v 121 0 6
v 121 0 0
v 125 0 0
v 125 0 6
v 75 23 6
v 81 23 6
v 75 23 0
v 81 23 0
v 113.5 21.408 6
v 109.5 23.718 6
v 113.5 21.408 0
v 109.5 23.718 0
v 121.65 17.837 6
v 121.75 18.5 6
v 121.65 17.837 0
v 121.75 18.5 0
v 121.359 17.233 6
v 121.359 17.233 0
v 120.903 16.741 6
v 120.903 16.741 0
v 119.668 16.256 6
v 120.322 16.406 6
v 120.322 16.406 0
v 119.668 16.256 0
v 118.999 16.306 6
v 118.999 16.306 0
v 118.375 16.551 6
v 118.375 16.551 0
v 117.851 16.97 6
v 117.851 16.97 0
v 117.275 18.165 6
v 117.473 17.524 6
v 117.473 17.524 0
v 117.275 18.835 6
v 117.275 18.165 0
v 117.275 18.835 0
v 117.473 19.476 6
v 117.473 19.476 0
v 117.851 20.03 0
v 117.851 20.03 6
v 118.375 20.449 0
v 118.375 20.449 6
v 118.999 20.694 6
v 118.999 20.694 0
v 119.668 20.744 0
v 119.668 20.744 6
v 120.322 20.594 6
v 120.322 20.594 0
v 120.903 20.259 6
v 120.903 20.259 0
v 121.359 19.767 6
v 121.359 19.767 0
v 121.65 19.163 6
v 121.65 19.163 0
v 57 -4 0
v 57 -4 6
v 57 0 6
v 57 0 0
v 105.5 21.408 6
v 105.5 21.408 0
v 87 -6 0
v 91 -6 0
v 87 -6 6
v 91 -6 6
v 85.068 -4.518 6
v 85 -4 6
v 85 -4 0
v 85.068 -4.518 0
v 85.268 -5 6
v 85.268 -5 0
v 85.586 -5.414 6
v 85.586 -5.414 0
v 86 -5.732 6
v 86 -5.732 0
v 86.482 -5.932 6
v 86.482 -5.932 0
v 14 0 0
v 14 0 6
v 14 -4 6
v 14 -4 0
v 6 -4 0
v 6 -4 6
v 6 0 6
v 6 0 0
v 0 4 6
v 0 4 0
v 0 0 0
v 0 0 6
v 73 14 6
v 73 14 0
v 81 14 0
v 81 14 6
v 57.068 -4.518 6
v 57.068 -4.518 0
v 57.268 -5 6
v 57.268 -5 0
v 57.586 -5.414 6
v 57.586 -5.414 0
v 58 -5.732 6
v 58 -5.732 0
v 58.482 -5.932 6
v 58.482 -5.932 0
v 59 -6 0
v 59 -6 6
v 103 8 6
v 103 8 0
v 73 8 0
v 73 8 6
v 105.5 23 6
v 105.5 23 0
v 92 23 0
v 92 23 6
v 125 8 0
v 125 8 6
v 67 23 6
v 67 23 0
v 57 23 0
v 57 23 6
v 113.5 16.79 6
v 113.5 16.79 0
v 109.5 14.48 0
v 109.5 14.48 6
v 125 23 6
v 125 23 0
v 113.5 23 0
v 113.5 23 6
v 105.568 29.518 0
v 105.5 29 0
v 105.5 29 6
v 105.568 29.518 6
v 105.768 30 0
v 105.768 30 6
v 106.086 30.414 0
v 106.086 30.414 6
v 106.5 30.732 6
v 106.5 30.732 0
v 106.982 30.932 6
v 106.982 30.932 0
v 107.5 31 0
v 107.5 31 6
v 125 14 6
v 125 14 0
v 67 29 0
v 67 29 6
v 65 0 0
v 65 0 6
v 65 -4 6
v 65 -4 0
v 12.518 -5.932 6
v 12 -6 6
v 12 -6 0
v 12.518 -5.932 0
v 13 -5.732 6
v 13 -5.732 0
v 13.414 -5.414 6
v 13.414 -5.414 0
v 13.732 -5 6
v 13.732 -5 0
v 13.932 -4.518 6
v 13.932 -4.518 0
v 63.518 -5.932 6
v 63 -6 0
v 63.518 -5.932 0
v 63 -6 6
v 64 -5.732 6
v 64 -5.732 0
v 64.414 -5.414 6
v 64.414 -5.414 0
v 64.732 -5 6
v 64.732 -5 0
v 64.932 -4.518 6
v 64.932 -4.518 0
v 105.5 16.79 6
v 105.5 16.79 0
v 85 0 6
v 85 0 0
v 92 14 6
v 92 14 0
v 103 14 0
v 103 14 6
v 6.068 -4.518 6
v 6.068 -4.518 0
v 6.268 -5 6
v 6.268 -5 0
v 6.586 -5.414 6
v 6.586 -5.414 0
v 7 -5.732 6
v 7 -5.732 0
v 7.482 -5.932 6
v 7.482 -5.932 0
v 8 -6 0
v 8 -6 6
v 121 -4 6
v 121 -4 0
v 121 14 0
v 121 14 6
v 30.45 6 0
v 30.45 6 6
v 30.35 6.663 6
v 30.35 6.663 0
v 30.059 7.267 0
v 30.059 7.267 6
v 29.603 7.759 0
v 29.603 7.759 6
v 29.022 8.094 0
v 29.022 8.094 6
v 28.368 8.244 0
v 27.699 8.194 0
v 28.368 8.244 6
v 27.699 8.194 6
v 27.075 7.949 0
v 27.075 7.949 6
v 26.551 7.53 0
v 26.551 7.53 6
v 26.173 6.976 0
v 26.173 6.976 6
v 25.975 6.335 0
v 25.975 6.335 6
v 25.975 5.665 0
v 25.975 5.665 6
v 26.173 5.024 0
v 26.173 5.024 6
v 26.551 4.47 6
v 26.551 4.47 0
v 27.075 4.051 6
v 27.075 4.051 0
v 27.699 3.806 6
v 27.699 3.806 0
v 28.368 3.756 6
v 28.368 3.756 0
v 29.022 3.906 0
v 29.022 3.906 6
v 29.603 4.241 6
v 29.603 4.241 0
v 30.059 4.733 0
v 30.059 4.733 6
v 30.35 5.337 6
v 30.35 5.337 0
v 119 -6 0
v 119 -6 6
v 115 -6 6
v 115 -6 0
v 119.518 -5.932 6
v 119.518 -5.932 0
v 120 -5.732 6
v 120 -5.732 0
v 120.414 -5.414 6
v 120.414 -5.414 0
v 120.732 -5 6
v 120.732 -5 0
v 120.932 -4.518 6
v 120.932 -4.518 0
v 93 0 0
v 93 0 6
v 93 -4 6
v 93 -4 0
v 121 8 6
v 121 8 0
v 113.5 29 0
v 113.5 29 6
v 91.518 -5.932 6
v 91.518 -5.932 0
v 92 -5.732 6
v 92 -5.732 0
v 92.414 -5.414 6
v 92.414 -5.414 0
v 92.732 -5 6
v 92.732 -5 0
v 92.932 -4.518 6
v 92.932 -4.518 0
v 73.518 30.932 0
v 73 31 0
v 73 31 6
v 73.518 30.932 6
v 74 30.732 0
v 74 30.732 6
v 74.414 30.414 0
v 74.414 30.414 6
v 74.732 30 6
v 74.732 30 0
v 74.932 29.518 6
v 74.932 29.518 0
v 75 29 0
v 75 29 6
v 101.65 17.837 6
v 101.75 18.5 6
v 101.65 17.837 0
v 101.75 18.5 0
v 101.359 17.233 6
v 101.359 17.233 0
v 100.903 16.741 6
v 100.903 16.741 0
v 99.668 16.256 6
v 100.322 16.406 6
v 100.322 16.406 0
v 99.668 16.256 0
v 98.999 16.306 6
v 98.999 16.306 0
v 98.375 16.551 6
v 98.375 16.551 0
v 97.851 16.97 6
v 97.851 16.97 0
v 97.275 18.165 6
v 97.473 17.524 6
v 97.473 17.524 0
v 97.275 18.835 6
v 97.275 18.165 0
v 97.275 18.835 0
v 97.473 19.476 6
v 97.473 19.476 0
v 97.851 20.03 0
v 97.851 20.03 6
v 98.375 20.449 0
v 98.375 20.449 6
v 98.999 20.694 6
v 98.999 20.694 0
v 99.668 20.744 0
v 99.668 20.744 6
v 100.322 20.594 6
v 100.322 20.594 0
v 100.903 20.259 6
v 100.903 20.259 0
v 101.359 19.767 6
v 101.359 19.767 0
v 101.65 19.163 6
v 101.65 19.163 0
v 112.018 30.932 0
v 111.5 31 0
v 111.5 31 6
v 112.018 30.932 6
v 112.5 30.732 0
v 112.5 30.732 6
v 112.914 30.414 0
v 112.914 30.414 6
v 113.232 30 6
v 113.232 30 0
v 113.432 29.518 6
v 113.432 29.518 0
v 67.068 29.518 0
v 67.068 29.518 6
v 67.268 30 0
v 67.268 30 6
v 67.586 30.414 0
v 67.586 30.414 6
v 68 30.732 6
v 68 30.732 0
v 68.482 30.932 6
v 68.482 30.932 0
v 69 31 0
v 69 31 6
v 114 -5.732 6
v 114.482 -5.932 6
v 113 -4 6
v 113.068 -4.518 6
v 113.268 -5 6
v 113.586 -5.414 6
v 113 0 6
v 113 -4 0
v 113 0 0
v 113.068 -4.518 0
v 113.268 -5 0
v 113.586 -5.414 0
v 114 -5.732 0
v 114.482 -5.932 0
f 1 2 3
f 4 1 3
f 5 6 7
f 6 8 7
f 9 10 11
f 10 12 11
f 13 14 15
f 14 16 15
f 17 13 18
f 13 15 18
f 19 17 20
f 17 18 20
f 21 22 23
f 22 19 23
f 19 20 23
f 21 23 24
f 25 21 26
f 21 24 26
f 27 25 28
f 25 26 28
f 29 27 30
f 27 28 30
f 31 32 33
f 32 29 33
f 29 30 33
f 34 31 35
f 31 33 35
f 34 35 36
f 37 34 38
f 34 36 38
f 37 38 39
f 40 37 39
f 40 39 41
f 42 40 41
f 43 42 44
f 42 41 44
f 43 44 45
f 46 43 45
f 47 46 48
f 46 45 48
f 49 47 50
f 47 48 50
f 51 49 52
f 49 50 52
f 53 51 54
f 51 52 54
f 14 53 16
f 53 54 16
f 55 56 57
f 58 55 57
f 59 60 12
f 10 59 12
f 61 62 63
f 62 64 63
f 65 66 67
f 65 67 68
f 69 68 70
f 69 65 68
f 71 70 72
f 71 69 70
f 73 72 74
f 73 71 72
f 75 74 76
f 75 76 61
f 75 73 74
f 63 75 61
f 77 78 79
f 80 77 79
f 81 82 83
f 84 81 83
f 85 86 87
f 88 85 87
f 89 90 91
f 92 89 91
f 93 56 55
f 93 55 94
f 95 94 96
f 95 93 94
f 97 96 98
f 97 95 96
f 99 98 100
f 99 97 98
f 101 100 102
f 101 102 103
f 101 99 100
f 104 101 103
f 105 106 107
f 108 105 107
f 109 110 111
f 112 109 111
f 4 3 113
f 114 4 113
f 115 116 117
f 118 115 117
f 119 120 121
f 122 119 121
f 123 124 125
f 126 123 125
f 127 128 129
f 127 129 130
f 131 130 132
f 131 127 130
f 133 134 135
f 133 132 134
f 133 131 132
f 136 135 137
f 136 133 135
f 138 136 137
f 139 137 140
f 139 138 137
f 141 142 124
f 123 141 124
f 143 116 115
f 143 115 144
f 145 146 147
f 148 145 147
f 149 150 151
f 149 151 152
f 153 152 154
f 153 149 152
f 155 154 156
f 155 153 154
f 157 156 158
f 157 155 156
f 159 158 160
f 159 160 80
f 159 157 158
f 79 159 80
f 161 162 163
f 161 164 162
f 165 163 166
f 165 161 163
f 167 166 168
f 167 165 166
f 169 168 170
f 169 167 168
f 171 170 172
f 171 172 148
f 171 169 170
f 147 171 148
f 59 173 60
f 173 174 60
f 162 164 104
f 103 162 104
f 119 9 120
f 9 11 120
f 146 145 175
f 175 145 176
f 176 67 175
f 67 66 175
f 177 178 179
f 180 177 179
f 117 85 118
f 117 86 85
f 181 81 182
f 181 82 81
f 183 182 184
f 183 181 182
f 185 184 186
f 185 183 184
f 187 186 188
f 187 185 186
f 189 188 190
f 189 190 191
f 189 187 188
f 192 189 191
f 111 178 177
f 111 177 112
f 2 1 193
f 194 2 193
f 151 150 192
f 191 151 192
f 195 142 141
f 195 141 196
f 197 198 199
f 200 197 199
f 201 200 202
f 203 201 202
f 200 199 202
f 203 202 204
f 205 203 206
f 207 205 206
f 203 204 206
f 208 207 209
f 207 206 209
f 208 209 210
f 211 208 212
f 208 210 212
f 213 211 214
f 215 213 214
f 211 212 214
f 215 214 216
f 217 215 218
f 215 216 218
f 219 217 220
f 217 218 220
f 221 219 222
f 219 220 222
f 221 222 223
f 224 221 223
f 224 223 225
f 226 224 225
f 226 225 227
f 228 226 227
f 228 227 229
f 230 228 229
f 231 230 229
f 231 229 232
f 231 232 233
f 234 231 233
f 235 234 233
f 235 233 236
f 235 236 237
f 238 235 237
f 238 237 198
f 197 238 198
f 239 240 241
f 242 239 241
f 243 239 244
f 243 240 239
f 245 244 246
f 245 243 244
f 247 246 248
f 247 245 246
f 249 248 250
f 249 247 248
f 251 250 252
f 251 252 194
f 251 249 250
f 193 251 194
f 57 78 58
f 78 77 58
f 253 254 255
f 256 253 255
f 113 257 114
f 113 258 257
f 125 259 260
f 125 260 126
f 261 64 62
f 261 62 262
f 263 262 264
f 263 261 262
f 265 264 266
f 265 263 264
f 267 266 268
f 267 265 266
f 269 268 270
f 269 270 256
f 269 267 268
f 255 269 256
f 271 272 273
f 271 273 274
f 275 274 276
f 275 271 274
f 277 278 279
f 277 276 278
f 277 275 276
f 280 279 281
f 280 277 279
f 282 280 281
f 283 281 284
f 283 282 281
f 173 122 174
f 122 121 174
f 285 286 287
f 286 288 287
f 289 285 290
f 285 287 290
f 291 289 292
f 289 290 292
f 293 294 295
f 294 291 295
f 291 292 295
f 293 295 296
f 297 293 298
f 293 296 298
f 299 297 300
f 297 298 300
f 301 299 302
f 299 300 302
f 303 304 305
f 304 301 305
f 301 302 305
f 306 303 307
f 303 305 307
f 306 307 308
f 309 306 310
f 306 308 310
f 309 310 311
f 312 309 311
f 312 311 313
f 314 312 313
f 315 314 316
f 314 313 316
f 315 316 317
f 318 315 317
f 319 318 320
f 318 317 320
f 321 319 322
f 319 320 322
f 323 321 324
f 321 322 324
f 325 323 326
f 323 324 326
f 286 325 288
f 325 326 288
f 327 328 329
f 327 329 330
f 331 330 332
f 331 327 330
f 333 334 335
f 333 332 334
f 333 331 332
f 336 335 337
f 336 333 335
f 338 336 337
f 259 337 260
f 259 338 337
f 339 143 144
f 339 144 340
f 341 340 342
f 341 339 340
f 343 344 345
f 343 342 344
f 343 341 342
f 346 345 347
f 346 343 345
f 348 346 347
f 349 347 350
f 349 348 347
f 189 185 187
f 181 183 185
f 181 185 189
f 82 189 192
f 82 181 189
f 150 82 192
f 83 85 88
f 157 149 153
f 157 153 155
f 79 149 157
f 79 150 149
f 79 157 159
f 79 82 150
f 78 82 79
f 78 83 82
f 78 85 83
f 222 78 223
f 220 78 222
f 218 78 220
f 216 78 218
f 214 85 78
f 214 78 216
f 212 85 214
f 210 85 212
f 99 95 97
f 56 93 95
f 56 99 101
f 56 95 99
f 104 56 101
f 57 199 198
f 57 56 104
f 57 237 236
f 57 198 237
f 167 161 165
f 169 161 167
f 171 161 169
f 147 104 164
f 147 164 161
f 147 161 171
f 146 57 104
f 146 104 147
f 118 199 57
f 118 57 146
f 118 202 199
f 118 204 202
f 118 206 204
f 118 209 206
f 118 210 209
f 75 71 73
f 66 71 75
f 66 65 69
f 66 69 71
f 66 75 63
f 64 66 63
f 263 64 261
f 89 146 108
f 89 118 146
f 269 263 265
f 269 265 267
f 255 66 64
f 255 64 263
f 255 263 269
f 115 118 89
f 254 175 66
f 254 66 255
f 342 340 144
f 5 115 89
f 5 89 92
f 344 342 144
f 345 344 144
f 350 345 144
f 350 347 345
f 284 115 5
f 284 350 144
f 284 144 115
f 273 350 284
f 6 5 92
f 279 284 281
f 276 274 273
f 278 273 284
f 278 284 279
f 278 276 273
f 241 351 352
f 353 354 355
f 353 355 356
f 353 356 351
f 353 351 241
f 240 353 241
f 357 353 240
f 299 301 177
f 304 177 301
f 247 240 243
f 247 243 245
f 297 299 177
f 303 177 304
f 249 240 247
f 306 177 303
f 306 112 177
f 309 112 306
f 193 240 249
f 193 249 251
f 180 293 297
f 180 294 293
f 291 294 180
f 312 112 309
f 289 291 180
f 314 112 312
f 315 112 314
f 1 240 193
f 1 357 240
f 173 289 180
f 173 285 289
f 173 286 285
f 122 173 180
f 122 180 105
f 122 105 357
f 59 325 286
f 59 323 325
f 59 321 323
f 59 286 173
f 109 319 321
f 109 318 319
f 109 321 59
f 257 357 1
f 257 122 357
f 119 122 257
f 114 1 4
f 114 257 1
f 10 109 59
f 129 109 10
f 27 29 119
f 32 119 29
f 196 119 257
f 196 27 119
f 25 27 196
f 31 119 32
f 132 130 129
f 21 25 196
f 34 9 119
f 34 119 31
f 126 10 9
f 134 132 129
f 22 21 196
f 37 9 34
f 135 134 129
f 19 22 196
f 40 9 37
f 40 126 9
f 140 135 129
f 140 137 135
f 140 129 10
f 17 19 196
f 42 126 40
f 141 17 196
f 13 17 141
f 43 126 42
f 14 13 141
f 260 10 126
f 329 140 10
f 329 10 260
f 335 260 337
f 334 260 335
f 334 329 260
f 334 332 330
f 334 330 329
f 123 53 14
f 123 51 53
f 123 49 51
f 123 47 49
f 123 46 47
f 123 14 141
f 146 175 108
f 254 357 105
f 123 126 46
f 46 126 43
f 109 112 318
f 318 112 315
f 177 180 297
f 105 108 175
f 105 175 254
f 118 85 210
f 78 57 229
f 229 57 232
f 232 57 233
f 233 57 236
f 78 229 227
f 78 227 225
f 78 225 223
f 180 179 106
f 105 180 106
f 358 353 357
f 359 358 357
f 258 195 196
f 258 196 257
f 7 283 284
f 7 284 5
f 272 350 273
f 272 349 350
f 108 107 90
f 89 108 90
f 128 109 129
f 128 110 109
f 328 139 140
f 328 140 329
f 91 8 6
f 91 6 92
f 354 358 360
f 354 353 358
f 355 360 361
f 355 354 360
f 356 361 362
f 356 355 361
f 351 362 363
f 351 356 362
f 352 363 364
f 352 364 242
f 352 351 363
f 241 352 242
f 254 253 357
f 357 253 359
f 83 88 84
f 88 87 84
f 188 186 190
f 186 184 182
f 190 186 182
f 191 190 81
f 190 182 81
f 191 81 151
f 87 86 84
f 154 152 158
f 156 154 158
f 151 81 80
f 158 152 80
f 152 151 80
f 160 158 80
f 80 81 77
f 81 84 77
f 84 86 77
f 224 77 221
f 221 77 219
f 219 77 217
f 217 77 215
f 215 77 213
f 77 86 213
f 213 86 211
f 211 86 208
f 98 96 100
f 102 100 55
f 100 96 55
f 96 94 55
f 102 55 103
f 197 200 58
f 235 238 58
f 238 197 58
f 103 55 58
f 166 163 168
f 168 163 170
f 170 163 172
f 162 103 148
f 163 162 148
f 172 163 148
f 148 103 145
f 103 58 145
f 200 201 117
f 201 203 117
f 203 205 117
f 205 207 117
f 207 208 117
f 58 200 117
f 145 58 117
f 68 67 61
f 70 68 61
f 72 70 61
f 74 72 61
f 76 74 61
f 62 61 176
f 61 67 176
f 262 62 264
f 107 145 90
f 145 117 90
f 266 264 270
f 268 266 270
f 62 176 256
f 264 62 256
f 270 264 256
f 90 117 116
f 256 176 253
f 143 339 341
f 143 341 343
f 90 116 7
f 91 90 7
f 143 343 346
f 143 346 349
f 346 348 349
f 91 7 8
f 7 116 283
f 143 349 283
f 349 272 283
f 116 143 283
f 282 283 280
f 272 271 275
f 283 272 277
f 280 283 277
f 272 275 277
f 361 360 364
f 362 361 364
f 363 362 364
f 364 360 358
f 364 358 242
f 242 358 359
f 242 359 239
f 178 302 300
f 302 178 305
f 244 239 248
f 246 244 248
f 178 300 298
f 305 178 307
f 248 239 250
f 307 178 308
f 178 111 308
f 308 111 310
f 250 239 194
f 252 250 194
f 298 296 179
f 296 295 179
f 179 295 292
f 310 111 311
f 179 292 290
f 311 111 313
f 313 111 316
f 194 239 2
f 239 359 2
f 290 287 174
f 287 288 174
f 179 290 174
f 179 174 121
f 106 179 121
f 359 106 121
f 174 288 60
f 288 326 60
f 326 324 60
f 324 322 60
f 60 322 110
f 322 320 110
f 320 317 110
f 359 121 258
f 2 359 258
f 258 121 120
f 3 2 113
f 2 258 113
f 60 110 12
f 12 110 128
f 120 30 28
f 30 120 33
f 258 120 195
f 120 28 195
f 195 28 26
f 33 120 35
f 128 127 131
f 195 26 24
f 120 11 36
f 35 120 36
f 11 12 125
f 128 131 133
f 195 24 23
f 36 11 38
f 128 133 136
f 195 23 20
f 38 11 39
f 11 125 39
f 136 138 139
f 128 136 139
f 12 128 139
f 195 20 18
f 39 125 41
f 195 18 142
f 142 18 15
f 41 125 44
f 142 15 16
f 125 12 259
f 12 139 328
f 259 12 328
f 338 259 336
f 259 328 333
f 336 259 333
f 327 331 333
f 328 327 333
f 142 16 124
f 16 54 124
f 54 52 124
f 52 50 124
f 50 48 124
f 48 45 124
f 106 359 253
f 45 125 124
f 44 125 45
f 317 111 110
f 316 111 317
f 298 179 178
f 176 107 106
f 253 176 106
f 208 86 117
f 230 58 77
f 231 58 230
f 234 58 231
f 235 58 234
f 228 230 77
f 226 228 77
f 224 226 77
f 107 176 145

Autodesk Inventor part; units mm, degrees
ref_plane "YZ Plane" through (0, 0, 0) normal (1, 0, 0) x (0, 1, 0)
ref_plane "XZ Plane" through (0, 0, 0) normal (0, 1, 0) x (-1, 0, 0)
ref_plane "XY Plane" through (0, 0, 0) normal (0, 0, 1) x (1, 0, 0)
sketch "Sketch1" plane through (0, 0, 0) normal (0, 0, 1) x (1, 0, 0)
  line L0 (0, 4) -> (0, 0)
  line L1 (0, 0) -> (125, 0)
  line L2 (0, 4) -> (57, 23)
  line L3 (103, 14) -> (103, 8)
  line L4 (103, 8) -> (73, 8)
  line L5 (73, 8) -> (73, 14)
  line L6 (125, 14) -> (121, 14)
  line L7 (121, 14) -> (121, 8)
  line L8 (121, 8) -> (125, 8)
  line L9 (125, 0) -> (125, 8)
  line L10 (125, 14) -> (125, 23)
  line L11 (81, 23) -> (81, 14)
  line L12 (92, 14) -> (92, 23)
  line L13 (73, 14) -> (81, 14)
  line L14 (92, 14) -> (103, 14)
  line L15 (81, 14) -> (92, 14) construction
  circle A0 centre (86.5, 19.099) radius 7.5 construction
  circle A1 centre (86.5, 19.099) radius 4 construction
  line L16 (113.5, 21.4084) -> (113.5, 16.7896)
  line L17 (113.5, 16.7896) -> (109.5, 14.4802)
  line L18 (109.5, 14.4802) -> (105.5, 16.7896)
  line L19 (105.5, 16.7896) -> (105.5, 21.4084)
  line L20 (105.5, 21.4084) -> (109.5, 23.7178)
  line L21 (109.5, 23.7178) -> (113.5, 21.4084)
  circle A2 centre (109.5, 19.099) radius 2.5 construction
  line L22 (105.5, 23) -> (105.5, 29)
  line L23 (107.5, 31) -> (111.5, 31)
  line L24 (113.5, 29) -> (113.5, 23)
  arc A3 (107.5, 31) -> (105.5, 29) centre (107.5, 29) ccw
  arc A4 (113.5, 29) -> (111.5, 31) centre (111.5, 29) ccw
  line L25 (125, 23) -> (113.5, 23)
  line L26 (105.5, 23) -> (92, 23)
  circle A5 centre (99.5, 18.5) radius 4.5 construction
  circle A6 centre (119.5, 18.5) radius 4.5 construction
  circle A7 centre (99.5, 18.5) radius 2.25
  circle A8 centre (119.5, 18.5) radius 2.25
  line L27 (67, 23) -> (67, 29)
  line L28 (69, 31) -> (73, 31)
  line L29 (75, 29) -> (75, 23)
  arc A9 (69, 31) -> (67, 29) centre (69, 29) ccw
  arc A10 (75, 29) -> (73, 31) centre (73, 29) ccw
  line L30 (81, 23) -> (75, 23)
  line L31 (67, 23) -> (57, 23)
  point P0 (81, 14)
  point P1 (92, 14)
  point P2 (86.5, 14)
  point P3 (125, 18.5)
  point P4 (109.5, 31)
  dimension "d0" = 8
  dimension "d2" = 6
  dimension "d3" = 4
  dimension "d4" = 15
  dimension "d5" = 8
  dimension "d6" = 9
  dimension "d7" = 11
  dimension "d8" = 11
  dimension "d9" = 8
  dimension "d10" = 5
  dimension "d11" = 2
  dimension "d12" = 8
  dimension "d13" = 9
  dimension "d14" = 9
  dimension "d15" = 10
  dimension "d16" = 10
  dimension "d17" = 4.5
  dimension "d18" = 4.5
  dimension "d19" = 13
  dimension "d20" = 5.5
  dimension "d21" = 18
  dimension "d22" = 2
  dimension "d23" = 8
  dimension "d24" = 6
  dimension "d25" = 10
  dimension "d27" = 30
  dimension "d28" = 4
  dimension "d30" = 8
  dimension "d31" = 125
extrude "Extrusion1" add sketch "Sketch1" along normal blind 6
sketch "Sketch2" plane through (0, 0, 6) normal (0, 0, 1) x (1, 0, 0)
  line L0 (0, 4) -> (0, 0) projected
  line L1 (0, 0) -> (125, 0) projected
  line L2 (6, 0) -> (14, 0)
  line L3 (14, 0) -> (14, -4)
  line L4 (12, -6) -> (8, -6)
  line L5 (6, -4) -> (6, 0)
  line L6 (57, 0) -> (65, 0)
  line L7 (65, 0) -> (65, -4)
  line L8 (63, -6) -> (59, -6)
  line L9 (57, -4) -> (57, 0)
  line L10 (85, 0) -> (93, 0)
  line L11 (93, 0) -> (93, -4)
  line L12 (91, -6) -> (87, -6)
  line L13 (85, -4) -> (85, 0)
  line L14 (113, 0) -> (121, 0)
  line L15 (121, 0) -> (121, -4)
  line L16 (119, -6) -> (115, -6)
  line L17 (113, -4) -> (113, 0)
  arc A0 (6, -4) -> (8, -6) centre (8, -4) ccw
  arc A1 (12, -6) -> (14, -4) centre (12, -4) ccw
  arc A2 (57, -4) -> (59, -6) centre (59, -4) ccw
  arc A3 (63, -6) -> (65, -4) centre (63, -4) ccw
  arc A4 (85, -4) -> (87, -6) centre (87, -4) ccw
  arc A5 (91, -6) -> (93, -4) centre (91, -4) ccw
  arc A6 (113, -4) -> (115, -6) centre (115, -4) ccw
  arc A7 (119, -6) -> (121, -4) centre (119, -4) ccw
  dimension "d34" = 2
  dimension "d35" = 8
  dimension "d36" = 8
  dimension "d37" = 8
  dimension "d38" = 8
  dimension "d39" = 6
  dimension "d40" = 6
  dimension "d41" = 43
  dimension "d42" = 20
  dimension "d43" = 20
extrude "Extrusion2" add sketch "Sketch2" against normal blind 6
sketch "Sketch3" plane through (0, 0, 6) normal (0, 0, 1) x (1, 0, 0)
  line L0 (0, 4) -> (0, 0) projected
  line L1 (14, 0) -> (57, 0) projected
  circle A0 centre (28.2, 6) radius 2.25
  circle A1 centre (28.2, 6) radius 4.5 construction
  dimension "d46" = 4.5
  dimension "d47" = 6
  dimension "d48" = 28.2
  dimension "d51" = 9
extrude "Extrusion3" cut sketch "Sketch3" against normal through all
properties part number "x_motor_wall_upper"
